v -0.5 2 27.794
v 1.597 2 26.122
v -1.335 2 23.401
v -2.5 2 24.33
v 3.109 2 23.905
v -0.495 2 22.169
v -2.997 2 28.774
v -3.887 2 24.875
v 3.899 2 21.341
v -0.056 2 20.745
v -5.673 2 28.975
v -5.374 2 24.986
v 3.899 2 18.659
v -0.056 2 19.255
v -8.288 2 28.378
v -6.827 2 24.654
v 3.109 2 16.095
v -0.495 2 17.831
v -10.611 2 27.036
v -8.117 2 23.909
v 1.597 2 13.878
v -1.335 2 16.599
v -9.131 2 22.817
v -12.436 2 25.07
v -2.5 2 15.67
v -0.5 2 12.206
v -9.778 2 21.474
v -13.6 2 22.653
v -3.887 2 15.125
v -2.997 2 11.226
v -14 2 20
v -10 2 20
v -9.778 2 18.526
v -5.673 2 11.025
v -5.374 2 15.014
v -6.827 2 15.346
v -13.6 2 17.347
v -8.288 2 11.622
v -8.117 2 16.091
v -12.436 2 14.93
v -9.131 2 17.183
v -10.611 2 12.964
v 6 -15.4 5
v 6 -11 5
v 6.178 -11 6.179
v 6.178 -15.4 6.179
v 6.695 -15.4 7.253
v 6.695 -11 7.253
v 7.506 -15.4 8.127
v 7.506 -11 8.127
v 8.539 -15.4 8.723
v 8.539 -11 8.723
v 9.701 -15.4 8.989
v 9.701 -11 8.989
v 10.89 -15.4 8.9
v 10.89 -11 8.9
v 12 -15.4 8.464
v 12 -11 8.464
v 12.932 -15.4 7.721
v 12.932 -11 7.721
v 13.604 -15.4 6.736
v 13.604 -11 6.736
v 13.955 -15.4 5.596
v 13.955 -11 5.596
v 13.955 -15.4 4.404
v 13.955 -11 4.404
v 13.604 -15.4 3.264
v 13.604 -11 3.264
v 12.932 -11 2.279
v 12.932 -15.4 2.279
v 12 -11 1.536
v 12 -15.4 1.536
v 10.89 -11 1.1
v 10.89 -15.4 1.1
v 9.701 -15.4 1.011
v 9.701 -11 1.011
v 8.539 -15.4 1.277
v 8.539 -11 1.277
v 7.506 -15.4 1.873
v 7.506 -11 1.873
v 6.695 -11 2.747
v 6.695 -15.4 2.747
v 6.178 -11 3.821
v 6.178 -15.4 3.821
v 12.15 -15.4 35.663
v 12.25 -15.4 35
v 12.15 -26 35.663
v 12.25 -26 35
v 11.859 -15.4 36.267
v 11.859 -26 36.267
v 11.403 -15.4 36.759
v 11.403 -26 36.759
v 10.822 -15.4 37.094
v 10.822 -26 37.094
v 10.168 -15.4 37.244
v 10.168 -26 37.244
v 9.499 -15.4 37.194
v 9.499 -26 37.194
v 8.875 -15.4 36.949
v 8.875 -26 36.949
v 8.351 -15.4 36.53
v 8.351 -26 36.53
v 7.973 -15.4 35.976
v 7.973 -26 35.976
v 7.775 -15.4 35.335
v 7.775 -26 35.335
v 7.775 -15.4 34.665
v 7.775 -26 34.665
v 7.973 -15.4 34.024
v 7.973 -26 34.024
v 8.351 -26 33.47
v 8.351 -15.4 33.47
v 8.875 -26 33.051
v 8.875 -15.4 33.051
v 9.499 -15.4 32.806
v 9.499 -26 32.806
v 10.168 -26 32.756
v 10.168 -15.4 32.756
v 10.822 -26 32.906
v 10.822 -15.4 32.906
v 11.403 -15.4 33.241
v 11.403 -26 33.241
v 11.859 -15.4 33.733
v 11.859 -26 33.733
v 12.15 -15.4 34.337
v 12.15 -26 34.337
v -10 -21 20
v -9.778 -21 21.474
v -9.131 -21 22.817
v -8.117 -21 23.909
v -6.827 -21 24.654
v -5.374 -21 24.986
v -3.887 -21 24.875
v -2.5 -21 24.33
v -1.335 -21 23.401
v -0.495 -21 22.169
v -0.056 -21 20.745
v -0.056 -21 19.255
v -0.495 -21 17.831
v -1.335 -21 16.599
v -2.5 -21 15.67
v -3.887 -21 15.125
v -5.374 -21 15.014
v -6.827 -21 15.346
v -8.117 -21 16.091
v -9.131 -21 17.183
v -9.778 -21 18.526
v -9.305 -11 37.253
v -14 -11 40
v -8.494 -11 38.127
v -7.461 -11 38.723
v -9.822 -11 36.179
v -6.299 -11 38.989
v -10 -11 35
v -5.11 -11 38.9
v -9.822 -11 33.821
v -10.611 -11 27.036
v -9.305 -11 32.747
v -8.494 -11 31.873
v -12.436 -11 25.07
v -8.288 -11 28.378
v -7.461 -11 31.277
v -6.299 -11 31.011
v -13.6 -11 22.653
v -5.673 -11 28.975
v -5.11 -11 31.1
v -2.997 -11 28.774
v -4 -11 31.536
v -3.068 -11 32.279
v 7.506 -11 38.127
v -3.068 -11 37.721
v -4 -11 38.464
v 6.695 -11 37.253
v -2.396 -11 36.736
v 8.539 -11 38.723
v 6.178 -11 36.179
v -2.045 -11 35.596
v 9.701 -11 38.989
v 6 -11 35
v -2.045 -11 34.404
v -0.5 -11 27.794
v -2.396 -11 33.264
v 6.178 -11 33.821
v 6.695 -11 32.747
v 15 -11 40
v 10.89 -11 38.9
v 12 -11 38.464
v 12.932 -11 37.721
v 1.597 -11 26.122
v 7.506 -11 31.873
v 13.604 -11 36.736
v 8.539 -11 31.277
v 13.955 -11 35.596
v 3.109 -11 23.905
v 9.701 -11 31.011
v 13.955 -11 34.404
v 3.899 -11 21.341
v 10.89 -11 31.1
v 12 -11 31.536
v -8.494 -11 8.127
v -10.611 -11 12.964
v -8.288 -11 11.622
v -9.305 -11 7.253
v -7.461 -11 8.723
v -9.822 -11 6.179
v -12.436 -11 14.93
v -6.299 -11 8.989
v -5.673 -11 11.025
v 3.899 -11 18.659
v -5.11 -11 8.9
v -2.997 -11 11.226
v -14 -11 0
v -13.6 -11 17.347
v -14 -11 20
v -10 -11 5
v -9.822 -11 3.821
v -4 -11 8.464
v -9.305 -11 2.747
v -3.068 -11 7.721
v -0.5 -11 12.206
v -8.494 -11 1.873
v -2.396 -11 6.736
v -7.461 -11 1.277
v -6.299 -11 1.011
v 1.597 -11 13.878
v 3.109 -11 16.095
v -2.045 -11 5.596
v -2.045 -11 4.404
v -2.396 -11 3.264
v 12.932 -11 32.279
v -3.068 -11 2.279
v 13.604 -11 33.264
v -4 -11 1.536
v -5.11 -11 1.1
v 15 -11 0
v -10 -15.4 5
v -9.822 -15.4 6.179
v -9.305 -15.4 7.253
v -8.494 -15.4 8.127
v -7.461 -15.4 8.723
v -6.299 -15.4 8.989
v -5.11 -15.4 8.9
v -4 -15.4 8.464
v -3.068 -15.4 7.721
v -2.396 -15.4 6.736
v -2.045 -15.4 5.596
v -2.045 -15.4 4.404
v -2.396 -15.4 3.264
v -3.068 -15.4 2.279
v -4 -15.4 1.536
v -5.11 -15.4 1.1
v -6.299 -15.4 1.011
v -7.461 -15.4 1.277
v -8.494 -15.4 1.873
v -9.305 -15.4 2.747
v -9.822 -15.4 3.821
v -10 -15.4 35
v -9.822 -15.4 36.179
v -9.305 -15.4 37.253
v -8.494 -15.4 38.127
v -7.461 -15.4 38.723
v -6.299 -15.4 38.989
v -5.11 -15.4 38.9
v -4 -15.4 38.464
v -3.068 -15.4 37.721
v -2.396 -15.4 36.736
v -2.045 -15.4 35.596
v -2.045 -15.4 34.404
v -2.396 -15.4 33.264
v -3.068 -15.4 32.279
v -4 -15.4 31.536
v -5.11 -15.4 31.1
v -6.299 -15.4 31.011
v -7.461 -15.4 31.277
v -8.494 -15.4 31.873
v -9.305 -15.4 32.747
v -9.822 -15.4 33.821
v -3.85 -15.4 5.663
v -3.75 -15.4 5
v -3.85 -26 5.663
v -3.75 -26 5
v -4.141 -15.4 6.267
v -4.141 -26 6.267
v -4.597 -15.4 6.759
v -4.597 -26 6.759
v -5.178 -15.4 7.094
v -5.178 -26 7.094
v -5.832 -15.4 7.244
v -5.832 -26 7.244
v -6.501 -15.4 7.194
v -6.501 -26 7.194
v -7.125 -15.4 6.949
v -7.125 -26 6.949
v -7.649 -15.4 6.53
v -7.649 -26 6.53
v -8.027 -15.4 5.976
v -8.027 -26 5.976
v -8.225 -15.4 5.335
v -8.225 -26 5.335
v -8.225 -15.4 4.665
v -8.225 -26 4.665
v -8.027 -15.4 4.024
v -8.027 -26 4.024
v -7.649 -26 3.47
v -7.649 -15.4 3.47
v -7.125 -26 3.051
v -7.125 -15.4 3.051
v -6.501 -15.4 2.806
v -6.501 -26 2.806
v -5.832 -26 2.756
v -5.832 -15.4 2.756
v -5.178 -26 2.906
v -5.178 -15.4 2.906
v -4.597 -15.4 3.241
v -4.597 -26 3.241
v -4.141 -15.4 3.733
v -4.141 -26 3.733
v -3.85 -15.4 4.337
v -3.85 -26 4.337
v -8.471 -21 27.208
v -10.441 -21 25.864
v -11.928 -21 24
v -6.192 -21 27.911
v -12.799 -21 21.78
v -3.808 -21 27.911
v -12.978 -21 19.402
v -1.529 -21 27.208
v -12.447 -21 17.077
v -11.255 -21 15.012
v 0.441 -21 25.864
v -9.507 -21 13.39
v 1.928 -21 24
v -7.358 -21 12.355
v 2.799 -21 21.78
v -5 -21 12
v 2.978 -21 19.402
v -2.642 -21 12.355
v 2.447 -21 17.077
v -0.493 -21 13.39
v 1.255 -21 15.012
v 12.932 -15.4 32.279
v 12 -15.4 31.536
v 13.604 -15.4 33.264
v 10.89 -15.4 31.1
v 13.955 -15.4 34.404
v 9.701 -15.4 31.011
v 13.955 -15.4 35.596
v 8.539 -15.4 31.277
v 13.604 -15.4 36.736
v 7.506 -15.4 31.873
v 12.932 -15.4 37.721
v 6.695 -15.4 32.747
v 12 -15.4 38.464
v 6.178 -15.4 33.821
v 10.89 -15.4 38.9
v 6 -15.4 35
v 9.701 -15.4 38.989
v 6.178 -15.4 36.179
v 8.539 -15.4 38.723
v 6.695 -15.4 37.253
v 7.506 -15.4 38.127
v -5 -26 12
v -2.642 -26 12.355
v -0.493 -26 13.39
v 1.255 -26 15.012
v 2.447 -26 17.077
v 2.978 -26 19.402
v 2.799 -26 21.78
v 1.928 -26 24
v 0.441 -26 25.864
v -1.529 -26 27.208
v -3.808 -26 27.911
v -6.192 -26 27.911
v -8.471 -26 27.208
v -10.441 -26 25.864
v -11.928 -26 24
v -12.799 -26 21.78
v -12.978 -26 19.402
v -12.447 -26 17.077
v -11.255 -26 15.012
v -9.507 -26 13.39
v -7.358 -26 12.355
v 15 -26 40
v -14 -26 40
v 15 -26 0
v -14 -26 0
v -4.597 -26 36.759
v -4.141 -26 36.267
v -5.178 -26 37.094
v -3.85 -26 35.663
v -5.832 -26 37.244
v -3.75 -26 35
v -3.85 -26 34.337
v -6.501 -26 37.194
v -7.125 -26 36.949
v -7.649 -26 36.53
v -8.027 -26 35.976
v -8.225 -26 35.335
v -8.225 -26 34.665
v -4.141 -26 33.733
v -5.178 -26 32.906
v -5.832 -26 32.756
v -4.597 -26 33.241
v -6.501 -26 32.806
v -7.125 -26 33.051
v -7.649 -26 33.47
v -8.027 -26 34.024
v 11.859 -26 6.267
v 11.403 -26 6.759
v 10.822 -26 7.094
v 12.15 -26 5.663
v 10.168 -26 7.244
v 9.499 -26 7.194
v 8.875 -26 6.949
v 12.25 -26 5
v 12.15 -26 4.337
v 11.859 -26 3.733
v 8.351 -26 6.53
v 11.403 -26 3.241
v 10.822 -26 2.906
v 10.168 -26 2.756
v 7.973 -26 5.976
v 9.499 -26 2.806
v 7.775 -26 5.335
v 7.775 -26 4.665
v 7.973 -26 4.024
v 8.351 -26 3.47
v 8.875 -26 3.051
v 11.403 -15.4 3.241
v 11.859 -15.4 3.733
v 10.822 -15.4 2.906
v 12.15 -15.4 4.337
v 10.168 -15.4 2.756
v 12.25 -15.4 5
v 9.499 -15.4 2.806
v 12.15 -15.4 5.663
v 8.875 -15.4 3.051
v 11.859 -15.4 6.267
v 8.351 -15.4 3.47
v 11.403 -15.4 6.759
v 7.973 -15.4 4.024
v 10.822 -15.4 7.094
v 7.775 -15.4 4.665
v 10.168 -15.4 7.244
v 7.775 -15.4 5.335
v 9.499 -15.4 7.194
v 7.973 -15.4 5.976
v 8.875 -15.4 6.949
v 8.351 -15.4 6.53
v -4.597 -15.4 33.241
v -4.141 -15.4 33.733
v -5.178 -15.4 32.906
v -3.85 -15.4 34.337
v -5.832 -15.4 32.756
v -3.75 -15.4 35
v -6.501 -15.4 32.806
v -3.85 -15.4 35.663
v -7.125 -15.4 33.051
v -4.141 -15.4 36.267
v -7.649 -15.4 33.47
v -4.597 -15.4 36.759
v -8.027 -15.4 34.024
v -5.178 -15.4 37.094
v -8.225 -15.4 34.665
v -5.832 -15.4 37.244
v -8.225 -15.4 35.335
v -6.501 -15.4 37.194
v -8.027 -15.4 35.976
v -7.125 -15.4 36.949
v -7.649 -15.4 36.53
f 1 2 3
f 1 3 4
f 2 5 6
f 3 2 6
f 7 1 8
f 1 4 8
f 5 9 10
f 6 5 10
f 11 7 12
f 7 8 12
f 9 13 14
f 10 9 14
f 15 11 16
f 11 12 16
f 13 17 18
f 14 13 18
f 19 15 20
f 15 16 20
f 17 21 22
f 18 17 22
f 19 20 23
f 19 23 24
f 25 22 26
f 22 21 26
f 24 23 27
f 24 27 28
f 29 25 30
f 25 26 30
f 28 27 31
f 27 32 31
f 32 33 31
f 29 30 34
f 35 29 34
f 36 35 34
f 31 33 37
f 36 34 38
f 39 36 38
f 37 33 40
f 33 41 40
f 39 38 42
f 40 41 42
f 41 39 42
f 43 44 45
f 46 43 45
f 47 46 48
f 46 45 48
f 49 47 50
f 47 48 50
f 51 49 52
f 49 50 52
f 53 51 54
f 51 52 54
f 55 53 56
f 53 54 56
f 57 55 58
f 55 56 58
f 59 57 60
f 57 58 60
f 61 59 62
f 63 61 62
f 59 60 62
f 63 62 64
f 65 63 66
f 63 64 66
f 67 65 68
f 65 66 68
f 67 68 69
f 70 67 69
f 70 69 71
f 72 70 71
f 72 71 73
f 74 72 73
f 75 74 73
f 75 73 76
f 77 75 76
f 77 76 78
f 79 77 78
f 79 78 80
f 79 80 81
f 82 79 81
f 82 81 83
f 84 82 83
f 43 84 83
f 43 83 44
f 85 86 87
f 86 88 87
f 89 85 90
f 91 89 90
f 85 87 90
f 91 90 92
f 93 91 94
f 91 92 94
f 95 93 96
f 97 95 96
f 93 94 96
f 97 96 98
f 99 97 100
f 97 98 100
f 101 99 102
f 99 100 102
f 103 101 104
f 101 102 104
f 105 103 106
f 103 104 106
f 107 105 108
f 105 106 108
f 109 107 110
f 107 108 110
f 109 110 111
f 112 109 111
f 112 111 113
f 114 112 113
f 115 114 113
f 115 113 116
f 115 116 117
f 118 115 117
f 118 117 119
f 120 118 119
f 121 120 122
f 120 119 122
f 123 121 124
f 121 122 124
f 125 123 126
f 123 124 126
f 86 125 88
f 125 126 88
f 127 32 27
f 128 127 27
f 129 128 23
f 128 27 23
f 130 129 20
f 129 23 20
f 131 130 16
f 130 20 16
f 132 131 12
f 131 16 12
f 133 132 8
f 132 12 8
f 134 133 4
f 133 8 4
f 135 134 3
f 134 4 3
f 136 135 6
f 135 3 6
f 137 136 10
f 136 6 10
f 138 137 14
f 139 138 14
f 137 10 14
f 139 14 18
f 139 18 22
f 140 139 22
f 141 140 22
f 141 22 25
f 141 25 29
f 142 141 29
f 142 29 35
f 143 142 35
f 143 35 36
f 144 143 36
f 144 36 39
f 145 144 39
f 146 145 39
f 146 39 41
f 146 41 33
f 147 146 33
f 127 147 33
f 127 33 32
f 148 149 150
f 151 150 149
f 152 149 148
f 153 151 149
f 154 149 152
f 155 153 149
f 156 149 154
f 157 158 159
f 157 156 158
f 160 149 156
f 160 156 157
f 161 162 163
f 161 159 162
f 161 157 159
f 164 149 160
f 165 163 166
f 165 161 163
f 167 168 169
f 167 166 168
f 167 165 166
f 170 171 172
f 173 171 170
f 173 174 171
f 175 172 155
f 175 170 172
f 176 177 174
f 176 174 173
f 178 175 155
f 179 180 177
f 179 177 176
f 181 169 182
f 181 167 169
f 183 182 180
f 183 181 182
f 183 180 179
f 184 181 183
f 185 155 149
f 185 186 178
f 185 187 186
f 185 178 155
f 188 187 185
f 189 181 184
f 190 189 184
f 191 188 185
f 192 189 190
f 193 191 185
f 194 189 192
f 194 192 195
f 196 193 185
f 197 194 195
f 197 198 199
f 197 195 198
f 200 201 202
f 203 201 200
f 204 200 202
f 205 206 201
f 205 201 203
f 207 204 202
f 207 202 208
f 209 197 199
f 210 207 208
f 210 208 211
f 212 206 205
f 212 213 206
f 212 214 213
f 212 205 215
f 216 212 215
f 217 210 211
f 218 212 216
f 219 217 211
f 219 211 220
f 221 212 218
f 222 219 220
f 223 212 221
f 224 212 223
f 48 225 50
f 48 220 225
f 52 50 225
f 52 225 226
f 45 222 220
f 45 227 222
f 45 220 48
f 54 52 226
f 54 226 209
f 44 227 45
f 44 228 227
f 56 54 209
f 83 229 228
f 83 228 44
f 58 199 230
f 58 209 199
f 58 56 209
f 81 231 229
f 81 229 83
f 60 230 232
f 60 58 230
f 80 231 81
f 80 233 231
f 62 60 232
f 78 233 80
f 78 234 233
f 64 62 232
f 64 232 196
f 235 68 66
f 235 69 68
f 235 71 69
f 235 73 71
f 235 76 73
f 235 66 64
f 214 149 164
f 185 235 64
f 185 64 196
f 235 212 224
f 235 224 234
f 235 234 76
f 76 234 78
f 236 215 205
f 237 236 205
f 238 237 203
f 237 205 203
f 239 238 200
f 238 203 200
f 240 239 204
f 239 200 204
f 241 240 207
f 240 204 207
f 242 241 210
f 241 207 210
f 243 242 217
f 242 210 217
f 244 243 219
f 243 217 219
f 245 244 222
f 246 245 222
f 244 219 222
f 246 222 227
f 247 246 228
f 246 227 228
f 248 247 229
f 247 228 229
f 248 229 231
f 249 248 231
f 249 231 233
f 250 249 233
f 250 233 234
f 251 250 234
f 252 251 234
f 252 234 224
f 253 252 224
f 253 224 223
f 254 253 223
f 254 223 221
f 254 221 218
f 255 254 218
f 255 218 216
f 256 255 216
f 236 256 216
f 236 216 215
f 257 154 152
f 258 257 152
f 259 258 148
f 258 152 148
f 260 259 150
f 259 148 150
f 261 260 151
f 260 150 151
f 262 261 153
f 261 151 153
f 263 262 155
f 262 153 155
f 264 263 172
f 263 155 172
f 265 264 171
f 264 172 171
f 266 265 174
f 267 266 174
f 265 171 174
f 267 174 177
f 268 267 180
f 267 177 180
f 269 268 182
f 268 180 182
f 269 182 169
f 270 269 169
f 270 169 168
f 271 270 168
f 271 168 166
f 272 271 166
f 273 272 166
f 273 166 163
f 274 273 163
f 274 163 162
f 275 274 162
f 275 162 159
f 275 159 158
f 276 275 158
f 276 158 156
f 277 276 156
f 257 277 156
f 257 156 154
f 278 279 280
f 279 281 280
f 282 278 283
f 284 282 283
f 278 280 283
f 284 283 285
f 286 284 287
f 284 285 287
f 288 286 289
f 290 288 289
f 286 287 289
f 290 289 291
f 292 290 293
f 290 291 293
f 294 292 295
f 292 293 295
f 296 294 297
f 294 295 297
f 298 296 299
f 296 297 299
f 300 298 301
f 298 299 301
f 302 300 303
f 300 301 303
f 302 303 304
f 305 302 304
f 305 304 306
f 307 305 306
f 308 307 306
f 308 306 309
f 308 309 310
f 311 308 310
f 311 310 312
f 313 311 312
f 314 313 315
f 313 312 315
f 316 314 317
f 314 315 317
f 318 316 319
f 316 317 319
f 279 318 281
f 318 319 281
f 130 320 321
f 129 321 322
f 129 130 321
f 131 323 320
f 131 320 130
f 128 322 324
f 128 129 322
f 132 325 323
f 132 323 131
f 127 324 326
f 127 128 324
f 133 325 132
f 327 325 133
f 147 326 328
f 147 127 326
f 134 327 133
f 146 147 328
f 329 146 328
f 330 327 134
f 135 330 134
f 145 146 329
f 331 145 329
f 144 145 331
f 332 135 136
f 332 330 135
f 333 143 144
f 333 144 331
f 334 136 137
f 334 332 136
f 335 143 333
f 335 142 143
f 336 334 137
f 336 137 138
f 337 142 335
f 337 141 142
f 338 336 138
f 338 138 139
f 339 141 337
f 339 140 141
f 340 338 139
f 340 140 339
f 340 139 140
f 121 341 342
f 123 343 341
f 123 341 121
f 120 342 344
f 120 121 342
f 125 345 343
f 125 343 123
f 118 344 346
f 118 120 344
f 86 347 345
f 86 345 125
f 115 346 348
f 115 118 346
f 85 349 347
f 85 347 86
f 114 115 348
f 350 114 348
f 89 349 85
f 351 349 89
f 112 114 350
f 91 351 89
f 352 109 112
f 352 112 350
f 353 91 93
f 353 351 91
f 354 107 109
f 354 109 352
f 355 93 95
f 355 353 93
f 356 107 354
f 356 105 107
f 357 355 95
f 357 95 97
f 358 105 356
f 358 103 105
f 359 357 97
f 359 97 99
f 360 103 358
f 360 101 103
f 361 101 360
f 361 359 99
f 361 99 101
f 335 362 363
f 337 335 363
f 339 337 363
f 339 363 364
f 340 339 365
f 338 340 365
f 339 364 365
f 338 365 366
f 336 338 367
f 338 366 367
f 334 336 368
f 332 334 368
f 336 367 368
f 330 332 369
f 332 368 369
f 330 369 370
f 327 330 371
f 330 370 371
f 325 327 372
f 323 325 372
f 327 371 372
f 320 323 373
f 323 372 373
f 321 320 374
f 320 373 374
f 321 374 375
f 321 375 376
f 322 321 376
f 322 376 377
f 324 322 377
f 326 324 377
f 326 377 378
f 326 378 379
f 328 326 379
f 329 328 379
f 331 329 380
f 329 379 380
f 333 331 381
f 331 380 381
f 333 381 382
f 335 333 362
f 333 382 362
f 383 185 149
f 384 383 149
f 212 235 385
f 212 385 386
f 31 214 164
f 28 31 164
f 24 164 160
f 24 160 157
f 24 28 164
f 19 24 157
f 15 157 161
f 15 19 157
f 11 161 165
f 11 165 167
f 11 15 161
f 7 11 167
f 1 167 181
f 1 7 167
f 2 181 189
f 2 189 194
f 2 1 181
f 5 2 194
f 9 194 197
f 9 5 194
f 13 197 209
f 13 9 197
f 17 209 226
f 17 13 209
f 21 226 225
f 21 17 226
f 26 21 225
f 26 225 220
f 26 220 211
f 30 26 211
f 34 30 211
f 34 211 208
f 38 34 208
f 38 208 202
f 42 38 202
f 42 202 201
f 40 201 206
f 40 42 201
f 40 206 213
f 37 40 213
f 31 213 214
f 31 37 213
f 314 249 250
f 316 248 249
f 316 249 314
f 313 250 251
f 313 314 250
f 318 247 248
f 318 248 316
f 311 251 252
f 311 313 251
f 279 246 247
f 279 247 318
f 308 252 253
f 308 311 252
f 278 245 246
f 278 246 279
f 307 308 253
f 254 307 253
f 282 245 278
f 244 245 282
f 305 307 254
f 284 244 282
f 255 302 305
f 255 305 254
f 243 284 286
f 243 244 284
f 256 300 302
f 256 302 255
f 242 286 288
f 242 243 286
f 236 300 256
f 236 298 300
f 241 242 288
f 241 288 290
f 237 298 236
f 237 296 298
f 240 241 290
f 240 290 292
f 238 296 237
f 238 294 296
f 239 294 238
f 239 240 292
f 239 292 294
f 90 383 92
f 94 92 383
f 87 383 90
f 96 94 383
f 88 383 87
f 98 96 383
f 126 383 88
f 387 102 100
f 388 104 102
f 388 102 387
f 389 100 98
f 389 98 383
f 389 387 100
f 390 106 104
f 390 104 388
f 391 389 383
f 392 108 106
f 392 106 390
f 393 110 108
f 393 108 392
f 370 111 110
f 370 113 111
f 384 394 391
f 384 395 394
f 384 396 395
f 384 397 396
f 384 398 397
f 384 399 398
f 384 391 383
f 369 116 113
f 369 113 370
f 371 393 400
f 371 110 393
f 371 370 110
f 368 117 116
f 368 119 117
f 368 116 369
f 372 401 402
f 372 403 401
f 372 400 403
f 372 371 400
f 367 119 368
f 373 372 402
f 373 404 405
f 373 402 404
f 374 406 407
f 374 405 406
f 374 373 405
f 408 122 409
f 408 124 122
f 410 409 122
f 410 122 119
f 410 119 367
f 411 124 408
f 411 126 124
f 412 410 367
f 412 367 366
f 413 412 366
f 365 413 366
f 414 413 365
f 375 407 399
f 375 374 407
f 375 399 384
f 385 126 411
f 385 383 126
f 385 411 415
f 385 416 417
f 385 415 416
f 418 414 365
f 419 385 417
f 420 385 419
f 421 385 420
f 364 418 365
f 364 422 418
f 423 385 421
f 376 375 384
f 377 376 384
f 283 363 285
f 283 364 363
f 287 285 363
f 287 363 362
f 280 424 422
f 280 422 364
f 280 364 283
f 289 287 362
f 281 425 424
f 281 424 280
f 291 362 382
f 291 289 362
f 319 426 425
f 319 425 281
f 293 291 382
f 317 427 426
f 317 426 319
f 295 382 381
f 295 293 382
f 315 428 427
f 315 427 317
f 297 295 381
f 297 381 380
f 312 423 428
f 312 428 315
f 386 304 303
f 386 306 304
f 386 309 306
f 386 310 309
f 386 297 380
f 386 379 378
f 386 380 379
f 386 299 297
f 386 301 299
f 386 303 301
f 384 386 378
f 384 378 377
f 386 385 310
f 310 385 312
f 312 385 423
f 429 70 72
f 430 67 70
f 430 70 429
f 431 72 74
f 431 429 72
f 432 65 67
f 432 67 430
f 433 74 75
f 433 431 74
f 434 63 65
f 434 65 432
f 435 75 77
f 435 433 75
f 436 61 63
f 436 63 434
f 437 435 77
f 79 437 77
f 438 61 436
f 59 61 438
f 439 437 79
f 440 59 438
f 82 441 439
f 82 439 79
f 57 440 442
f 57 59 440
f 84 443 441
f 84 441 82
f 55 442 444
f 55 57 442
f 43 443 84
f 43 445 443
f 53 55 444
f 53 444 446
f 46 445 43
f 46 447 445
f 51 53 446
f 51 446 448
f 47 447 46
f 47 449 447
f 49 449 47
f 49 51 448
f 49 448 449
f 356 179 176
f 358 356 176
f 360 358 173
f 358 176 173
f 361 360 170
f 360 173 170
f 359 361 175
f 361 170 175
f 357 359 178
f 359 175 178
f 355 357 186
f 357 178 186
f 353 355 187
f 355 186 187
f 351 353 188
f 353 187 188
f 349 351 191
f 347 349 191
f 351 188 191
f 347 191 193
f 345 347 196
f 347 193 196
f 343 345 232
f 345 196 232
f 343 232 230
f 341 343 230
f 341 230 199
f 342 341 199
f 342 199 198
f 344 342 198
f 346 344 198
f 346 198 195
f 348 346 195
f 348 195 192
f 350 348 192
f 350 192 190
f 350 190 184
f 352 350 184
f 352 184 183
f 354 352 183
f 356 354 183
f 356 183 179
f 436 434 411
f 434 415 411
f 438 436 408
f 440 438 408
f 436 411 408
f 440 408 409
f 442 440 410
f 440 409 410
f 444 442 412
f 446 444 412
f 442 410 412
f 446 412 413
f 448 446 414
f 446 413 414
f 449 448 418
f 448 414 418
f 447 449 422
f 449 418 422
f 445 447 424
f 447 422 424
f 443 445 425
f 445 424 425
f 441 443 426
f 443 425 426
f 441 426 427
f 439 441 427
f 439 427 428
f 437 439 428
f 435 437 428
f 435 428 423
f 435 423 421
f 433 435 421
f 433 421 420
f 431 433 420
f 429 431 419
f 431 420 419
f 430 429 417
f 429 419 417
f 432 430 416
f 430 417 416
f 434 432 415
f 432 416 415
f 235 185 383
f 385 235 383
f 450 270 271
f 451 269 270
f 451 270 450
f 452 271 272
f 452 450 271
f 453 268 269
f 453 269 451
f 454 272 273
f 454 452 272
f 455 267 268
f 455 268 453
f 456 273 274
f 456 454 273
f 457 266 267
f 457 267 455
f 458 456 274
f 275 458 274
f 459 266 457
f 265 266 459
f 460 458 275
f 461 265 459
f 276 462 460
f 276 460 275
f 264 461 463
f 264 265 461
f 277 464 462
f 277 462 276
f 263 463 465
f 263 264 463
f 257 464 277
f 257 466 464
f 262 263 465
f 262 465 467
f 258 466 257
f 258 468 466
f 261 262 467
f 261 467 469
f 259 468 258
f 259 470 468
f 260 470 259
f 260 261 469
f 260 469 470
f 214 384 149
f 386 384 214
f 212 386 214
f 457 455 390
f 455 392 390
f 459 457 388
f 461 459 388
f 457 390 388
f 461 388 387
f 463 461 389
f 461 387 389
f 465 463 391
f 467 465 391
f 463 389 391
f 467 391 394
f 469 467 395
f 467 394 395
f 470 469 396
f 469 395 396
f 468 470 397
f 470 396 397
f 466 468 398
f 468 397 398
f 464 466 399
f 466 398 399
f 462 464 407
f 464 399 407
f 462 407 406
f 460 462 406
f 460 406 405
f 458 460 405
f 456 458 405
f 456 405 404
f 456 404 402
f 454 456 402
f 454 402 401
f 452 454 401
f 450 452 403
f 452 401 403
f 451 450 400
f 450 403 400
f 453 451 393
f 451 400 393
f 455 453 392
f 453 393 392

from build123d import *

# Parameters (mm, degrees)
EXTRUDE_1_DEPTH             = 40
SKETCH_9_R                  = 5
CUT_EXTRUDE_3_DEPTH         = 52.078371156
SKETCH_16_OUTSIDE_W         = 42.358
SKETCH_16_OUTSIDE_H         = 53.358
SKETCH_16_OUTSIDE_R         = 9
CUT_EXTRUDE_4_DEPTH         = 13
HOLE_WIZARD_M41_D           = 4.5
HOLE_WIZARD_M41_CBORE_D     = 8
HOLE_WIZARD_M41_CBORE_DEPTH = 4.4
SKETCH_19_R                 = 8
CUT_EXTRUDE_5_DEPTH         = 5


with BuildPart() as part:
    # Эскиз1 → Бобышка-Вытянуть1 (new body)
    with BuildSketch(Plane.XY):
        Polygon((7.5, 0), (7.5, -11), (15, -11), (15, -26), (-14, -26), (-14, 2), (0, 2), (7.5, 2), align=None)
    extrude(amount=EXTRUDE_1_DEPTH)

    # Эскиз9 → Вырез-Вытянуть3 (cut, through all)
    with BuildSketch(Plane(origin=(0, 2, 0), x_dir=(1, 0, 0), z_dir=(0, 1, 0))):
        with Locations(Location((-5, -20, 0), (0, 0, 180))):
            Circle(SKETCH_9_R)
    extrude(amount=-CUT_EXTRUDE_3_DEPTH, mode=Mode.SUBTRACT)

    # Эскиз16 outside → Вырез-Вытянуть4 (cut)
    with BuildSketch(Plane(origin=(0, 2, 0), x_dir=(1, 0, 0), z_dir=(0, 1, 0))):
        with Locations((0.5, -20)):
            Rectangle(SKETCH_16_OUTSIDE_W, SKETCH_16_OUTSIDE_H)
        with Locations(Location((-5, -20, 0), (0, 0, 180))):
            Circle(SKETCH_16_OUTSIDE_R, mode=Mode.SUBTRACT)
    extrude(amount=-CUT_EXTRUDE_4_DEPTH, mode=Mode.SUBTRACT)

    # Цековка для  винта с внутренним шестигранником M41 (through all)
    with Locations(Plane(origin=(0, -11, 0), x_dir=(-1, 0, 0), z_dir=(0, 1, 0))):
        with Locations((-10, 35), (-10, 5), (6, 35), (6, 5)):
            CounterBoreHole(HOLE_WIZARD_M41_D / 2, HOLE_WIZARD_M41_CBORE_D / 2, HOLE_WIZARD_M41_CBORE_DEPTH)

    # Эскиз19 → Вырез-Вытянуть5 (cut)
    with BuildSketch(Plane.XZ.offset(26)):
        with Locations(Location((-5, 20, 0), (0, 0, 270))):
            Circle(SKETCH_19_R)
    extrude(amount=-CUT_EXTRUDE_5_DEPTH, mode=Mode.SUBTRACT)


solid = part.part
